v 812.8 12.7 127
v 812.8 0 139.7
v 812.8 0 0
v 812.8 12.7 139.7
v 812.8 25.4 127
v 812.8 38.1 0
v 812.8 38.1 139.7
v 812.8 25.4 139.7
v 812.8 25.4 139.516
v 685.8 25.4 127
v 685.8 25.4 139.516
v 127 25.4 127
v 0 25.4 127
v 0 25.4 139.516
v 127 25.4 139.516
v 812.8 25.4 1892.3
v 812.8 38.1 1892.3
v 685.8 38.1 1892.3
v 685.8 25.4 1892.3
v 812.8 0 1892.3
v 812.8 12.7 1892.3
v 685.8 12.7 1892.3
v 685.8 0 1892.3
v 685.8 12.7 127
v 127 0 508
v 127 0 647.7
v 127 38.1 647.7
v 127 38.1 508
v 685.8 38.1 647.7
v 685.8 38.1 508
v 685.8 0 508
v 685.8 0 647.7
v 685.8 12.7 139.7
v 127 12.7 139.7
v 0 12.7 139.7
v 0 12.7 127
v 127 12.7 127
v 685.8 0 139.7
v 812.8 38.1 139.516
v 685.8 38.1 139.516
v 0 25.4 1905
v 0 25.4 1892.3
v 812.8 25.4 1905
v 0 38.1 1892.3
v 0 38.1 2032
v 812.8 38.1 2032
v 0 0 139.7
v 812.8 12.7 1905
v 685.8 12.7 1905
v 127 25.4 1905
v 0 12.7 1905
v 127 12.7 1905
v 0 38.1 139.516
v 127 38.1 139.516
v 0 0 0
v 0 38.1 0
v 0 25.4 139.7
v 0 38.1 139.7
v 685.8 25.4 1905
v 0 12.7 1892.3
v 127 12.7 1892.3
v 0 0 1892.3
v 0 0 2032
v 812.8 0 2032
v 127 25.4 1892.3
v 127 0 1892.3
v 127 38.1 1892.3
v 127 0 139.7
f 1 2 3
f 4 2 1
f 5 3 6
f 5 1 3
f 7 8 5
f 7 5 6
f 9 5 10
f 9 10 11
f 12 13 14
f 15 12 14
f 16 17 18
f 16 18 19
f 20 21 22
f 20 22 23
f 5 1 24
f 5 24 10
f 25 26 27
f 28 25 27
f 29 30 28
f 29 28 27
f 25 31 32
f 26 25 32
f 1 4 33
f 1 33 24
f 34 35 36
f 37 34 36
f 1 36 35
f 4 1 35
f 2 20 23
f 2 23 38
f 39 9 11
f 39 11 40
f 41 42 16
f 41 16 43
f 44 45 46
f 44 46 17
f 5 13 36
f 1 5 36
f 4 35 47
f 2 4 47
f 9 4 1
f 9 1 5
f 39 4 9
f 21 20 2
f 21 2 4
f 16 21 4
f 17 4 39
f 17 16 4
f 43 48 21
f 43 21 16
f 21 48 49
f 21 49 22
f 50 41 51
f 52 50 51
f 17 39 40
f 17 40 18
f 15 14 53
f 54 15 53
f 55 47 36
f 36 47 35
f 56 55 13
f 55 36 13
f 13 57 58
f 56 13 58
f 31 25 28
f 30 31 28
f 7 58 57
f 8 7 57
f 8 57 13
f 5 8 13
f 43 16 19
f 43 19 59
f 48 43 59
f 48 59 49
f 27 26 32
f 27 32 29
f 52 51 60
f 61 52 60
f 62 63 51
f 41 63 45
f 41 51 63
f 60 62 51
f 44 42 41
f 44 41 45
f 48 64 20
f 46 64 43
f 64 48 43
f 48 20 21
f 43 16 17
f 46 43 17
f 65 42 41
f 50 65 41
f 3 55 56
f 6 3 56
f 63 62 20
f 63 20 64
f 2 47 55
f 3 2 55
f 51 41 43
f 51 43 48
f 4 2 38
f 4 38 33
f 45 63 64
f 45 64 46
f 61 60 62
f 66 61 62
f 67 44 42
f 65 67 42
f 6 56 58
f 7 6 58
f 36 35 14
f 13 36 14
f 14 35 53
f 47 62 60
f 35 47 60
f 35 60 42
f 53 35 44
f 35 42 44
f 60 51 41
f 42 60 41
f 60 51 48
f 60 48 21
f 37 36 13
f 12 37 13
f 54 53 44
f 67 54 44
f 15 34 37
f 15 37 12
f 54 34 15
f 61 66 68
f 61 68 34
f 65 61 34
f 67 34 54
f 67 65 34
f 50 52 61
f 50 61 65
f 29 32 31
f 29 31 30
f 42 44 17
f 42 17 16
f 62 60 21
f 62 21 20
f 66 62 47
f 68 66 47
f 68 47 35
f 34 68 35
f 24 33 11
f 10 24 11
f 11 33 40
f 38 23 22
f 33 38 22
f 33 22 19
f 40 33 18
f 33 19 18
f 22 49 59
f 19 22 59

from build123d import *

# Parameters (mm, degrees)
F1_DEPTH  = 812.8
F5_DEPTH  = 127
F12_W     = 38.1
F12_H     = 139.7
F13_DEPTH = 279.4


# Not quite as in the source:
# - a feature of the source that left no trace in its solid (it failed there, or was rolled back) is left out


with BuildPart() as f1:
    # F0 (on Right) → F1 (new body)
    with BuildSketch(Plane.YZ):
        Polygon((0, 139.7), (0, 0), (38.1, 0), (38.1, 139.7), (25.4, 139.7), (25.4, 127), (12.7, 127), (12.7, 139.7), align=None)
    extrude(amount=F1_DEPTH)


with BuildPart() as f3_1:
    # F3: instance of F1
    add(f1.part.mirror(Plane.XY.offset(1016)))


with BuildPart() as f5:
    # F4 (on Right) → F5 (new body)
    with BuildSketch(Plane.YZ):
        Polygon((0, 1892.3), (0, 139.7), (12.7, 139.7), (12.7, 127), (25.4, 127), (25.4, 139.51589757), (38.1, 139.51589757), (38.1, 1892.3), (25.4, 1892.3), (25.4, 1905), (12.7, 1905), (12.7, 1892.3), align=None)
    extrude(amount=F5_DEPTH)


with BuildPart() as f7_1:
    # F7: instance of F5
    add(f5.part.mirror(Plane.YZ.offset(406.4)))


with BuildPart() as f13:
    # F12 (on offset) → F13 (new body, symmetric)
    with BuildSketch(Plane.YZ.offset(406.4)):
        with Locations((19.05, 577.85)):
            Rectangle(F12_W, F12_H)
    extrude(amount=F13_DEPTH, both=True)


solid = Compound([f1.part, f3_1.part, f5.part, f7_1.part, f13.part])
